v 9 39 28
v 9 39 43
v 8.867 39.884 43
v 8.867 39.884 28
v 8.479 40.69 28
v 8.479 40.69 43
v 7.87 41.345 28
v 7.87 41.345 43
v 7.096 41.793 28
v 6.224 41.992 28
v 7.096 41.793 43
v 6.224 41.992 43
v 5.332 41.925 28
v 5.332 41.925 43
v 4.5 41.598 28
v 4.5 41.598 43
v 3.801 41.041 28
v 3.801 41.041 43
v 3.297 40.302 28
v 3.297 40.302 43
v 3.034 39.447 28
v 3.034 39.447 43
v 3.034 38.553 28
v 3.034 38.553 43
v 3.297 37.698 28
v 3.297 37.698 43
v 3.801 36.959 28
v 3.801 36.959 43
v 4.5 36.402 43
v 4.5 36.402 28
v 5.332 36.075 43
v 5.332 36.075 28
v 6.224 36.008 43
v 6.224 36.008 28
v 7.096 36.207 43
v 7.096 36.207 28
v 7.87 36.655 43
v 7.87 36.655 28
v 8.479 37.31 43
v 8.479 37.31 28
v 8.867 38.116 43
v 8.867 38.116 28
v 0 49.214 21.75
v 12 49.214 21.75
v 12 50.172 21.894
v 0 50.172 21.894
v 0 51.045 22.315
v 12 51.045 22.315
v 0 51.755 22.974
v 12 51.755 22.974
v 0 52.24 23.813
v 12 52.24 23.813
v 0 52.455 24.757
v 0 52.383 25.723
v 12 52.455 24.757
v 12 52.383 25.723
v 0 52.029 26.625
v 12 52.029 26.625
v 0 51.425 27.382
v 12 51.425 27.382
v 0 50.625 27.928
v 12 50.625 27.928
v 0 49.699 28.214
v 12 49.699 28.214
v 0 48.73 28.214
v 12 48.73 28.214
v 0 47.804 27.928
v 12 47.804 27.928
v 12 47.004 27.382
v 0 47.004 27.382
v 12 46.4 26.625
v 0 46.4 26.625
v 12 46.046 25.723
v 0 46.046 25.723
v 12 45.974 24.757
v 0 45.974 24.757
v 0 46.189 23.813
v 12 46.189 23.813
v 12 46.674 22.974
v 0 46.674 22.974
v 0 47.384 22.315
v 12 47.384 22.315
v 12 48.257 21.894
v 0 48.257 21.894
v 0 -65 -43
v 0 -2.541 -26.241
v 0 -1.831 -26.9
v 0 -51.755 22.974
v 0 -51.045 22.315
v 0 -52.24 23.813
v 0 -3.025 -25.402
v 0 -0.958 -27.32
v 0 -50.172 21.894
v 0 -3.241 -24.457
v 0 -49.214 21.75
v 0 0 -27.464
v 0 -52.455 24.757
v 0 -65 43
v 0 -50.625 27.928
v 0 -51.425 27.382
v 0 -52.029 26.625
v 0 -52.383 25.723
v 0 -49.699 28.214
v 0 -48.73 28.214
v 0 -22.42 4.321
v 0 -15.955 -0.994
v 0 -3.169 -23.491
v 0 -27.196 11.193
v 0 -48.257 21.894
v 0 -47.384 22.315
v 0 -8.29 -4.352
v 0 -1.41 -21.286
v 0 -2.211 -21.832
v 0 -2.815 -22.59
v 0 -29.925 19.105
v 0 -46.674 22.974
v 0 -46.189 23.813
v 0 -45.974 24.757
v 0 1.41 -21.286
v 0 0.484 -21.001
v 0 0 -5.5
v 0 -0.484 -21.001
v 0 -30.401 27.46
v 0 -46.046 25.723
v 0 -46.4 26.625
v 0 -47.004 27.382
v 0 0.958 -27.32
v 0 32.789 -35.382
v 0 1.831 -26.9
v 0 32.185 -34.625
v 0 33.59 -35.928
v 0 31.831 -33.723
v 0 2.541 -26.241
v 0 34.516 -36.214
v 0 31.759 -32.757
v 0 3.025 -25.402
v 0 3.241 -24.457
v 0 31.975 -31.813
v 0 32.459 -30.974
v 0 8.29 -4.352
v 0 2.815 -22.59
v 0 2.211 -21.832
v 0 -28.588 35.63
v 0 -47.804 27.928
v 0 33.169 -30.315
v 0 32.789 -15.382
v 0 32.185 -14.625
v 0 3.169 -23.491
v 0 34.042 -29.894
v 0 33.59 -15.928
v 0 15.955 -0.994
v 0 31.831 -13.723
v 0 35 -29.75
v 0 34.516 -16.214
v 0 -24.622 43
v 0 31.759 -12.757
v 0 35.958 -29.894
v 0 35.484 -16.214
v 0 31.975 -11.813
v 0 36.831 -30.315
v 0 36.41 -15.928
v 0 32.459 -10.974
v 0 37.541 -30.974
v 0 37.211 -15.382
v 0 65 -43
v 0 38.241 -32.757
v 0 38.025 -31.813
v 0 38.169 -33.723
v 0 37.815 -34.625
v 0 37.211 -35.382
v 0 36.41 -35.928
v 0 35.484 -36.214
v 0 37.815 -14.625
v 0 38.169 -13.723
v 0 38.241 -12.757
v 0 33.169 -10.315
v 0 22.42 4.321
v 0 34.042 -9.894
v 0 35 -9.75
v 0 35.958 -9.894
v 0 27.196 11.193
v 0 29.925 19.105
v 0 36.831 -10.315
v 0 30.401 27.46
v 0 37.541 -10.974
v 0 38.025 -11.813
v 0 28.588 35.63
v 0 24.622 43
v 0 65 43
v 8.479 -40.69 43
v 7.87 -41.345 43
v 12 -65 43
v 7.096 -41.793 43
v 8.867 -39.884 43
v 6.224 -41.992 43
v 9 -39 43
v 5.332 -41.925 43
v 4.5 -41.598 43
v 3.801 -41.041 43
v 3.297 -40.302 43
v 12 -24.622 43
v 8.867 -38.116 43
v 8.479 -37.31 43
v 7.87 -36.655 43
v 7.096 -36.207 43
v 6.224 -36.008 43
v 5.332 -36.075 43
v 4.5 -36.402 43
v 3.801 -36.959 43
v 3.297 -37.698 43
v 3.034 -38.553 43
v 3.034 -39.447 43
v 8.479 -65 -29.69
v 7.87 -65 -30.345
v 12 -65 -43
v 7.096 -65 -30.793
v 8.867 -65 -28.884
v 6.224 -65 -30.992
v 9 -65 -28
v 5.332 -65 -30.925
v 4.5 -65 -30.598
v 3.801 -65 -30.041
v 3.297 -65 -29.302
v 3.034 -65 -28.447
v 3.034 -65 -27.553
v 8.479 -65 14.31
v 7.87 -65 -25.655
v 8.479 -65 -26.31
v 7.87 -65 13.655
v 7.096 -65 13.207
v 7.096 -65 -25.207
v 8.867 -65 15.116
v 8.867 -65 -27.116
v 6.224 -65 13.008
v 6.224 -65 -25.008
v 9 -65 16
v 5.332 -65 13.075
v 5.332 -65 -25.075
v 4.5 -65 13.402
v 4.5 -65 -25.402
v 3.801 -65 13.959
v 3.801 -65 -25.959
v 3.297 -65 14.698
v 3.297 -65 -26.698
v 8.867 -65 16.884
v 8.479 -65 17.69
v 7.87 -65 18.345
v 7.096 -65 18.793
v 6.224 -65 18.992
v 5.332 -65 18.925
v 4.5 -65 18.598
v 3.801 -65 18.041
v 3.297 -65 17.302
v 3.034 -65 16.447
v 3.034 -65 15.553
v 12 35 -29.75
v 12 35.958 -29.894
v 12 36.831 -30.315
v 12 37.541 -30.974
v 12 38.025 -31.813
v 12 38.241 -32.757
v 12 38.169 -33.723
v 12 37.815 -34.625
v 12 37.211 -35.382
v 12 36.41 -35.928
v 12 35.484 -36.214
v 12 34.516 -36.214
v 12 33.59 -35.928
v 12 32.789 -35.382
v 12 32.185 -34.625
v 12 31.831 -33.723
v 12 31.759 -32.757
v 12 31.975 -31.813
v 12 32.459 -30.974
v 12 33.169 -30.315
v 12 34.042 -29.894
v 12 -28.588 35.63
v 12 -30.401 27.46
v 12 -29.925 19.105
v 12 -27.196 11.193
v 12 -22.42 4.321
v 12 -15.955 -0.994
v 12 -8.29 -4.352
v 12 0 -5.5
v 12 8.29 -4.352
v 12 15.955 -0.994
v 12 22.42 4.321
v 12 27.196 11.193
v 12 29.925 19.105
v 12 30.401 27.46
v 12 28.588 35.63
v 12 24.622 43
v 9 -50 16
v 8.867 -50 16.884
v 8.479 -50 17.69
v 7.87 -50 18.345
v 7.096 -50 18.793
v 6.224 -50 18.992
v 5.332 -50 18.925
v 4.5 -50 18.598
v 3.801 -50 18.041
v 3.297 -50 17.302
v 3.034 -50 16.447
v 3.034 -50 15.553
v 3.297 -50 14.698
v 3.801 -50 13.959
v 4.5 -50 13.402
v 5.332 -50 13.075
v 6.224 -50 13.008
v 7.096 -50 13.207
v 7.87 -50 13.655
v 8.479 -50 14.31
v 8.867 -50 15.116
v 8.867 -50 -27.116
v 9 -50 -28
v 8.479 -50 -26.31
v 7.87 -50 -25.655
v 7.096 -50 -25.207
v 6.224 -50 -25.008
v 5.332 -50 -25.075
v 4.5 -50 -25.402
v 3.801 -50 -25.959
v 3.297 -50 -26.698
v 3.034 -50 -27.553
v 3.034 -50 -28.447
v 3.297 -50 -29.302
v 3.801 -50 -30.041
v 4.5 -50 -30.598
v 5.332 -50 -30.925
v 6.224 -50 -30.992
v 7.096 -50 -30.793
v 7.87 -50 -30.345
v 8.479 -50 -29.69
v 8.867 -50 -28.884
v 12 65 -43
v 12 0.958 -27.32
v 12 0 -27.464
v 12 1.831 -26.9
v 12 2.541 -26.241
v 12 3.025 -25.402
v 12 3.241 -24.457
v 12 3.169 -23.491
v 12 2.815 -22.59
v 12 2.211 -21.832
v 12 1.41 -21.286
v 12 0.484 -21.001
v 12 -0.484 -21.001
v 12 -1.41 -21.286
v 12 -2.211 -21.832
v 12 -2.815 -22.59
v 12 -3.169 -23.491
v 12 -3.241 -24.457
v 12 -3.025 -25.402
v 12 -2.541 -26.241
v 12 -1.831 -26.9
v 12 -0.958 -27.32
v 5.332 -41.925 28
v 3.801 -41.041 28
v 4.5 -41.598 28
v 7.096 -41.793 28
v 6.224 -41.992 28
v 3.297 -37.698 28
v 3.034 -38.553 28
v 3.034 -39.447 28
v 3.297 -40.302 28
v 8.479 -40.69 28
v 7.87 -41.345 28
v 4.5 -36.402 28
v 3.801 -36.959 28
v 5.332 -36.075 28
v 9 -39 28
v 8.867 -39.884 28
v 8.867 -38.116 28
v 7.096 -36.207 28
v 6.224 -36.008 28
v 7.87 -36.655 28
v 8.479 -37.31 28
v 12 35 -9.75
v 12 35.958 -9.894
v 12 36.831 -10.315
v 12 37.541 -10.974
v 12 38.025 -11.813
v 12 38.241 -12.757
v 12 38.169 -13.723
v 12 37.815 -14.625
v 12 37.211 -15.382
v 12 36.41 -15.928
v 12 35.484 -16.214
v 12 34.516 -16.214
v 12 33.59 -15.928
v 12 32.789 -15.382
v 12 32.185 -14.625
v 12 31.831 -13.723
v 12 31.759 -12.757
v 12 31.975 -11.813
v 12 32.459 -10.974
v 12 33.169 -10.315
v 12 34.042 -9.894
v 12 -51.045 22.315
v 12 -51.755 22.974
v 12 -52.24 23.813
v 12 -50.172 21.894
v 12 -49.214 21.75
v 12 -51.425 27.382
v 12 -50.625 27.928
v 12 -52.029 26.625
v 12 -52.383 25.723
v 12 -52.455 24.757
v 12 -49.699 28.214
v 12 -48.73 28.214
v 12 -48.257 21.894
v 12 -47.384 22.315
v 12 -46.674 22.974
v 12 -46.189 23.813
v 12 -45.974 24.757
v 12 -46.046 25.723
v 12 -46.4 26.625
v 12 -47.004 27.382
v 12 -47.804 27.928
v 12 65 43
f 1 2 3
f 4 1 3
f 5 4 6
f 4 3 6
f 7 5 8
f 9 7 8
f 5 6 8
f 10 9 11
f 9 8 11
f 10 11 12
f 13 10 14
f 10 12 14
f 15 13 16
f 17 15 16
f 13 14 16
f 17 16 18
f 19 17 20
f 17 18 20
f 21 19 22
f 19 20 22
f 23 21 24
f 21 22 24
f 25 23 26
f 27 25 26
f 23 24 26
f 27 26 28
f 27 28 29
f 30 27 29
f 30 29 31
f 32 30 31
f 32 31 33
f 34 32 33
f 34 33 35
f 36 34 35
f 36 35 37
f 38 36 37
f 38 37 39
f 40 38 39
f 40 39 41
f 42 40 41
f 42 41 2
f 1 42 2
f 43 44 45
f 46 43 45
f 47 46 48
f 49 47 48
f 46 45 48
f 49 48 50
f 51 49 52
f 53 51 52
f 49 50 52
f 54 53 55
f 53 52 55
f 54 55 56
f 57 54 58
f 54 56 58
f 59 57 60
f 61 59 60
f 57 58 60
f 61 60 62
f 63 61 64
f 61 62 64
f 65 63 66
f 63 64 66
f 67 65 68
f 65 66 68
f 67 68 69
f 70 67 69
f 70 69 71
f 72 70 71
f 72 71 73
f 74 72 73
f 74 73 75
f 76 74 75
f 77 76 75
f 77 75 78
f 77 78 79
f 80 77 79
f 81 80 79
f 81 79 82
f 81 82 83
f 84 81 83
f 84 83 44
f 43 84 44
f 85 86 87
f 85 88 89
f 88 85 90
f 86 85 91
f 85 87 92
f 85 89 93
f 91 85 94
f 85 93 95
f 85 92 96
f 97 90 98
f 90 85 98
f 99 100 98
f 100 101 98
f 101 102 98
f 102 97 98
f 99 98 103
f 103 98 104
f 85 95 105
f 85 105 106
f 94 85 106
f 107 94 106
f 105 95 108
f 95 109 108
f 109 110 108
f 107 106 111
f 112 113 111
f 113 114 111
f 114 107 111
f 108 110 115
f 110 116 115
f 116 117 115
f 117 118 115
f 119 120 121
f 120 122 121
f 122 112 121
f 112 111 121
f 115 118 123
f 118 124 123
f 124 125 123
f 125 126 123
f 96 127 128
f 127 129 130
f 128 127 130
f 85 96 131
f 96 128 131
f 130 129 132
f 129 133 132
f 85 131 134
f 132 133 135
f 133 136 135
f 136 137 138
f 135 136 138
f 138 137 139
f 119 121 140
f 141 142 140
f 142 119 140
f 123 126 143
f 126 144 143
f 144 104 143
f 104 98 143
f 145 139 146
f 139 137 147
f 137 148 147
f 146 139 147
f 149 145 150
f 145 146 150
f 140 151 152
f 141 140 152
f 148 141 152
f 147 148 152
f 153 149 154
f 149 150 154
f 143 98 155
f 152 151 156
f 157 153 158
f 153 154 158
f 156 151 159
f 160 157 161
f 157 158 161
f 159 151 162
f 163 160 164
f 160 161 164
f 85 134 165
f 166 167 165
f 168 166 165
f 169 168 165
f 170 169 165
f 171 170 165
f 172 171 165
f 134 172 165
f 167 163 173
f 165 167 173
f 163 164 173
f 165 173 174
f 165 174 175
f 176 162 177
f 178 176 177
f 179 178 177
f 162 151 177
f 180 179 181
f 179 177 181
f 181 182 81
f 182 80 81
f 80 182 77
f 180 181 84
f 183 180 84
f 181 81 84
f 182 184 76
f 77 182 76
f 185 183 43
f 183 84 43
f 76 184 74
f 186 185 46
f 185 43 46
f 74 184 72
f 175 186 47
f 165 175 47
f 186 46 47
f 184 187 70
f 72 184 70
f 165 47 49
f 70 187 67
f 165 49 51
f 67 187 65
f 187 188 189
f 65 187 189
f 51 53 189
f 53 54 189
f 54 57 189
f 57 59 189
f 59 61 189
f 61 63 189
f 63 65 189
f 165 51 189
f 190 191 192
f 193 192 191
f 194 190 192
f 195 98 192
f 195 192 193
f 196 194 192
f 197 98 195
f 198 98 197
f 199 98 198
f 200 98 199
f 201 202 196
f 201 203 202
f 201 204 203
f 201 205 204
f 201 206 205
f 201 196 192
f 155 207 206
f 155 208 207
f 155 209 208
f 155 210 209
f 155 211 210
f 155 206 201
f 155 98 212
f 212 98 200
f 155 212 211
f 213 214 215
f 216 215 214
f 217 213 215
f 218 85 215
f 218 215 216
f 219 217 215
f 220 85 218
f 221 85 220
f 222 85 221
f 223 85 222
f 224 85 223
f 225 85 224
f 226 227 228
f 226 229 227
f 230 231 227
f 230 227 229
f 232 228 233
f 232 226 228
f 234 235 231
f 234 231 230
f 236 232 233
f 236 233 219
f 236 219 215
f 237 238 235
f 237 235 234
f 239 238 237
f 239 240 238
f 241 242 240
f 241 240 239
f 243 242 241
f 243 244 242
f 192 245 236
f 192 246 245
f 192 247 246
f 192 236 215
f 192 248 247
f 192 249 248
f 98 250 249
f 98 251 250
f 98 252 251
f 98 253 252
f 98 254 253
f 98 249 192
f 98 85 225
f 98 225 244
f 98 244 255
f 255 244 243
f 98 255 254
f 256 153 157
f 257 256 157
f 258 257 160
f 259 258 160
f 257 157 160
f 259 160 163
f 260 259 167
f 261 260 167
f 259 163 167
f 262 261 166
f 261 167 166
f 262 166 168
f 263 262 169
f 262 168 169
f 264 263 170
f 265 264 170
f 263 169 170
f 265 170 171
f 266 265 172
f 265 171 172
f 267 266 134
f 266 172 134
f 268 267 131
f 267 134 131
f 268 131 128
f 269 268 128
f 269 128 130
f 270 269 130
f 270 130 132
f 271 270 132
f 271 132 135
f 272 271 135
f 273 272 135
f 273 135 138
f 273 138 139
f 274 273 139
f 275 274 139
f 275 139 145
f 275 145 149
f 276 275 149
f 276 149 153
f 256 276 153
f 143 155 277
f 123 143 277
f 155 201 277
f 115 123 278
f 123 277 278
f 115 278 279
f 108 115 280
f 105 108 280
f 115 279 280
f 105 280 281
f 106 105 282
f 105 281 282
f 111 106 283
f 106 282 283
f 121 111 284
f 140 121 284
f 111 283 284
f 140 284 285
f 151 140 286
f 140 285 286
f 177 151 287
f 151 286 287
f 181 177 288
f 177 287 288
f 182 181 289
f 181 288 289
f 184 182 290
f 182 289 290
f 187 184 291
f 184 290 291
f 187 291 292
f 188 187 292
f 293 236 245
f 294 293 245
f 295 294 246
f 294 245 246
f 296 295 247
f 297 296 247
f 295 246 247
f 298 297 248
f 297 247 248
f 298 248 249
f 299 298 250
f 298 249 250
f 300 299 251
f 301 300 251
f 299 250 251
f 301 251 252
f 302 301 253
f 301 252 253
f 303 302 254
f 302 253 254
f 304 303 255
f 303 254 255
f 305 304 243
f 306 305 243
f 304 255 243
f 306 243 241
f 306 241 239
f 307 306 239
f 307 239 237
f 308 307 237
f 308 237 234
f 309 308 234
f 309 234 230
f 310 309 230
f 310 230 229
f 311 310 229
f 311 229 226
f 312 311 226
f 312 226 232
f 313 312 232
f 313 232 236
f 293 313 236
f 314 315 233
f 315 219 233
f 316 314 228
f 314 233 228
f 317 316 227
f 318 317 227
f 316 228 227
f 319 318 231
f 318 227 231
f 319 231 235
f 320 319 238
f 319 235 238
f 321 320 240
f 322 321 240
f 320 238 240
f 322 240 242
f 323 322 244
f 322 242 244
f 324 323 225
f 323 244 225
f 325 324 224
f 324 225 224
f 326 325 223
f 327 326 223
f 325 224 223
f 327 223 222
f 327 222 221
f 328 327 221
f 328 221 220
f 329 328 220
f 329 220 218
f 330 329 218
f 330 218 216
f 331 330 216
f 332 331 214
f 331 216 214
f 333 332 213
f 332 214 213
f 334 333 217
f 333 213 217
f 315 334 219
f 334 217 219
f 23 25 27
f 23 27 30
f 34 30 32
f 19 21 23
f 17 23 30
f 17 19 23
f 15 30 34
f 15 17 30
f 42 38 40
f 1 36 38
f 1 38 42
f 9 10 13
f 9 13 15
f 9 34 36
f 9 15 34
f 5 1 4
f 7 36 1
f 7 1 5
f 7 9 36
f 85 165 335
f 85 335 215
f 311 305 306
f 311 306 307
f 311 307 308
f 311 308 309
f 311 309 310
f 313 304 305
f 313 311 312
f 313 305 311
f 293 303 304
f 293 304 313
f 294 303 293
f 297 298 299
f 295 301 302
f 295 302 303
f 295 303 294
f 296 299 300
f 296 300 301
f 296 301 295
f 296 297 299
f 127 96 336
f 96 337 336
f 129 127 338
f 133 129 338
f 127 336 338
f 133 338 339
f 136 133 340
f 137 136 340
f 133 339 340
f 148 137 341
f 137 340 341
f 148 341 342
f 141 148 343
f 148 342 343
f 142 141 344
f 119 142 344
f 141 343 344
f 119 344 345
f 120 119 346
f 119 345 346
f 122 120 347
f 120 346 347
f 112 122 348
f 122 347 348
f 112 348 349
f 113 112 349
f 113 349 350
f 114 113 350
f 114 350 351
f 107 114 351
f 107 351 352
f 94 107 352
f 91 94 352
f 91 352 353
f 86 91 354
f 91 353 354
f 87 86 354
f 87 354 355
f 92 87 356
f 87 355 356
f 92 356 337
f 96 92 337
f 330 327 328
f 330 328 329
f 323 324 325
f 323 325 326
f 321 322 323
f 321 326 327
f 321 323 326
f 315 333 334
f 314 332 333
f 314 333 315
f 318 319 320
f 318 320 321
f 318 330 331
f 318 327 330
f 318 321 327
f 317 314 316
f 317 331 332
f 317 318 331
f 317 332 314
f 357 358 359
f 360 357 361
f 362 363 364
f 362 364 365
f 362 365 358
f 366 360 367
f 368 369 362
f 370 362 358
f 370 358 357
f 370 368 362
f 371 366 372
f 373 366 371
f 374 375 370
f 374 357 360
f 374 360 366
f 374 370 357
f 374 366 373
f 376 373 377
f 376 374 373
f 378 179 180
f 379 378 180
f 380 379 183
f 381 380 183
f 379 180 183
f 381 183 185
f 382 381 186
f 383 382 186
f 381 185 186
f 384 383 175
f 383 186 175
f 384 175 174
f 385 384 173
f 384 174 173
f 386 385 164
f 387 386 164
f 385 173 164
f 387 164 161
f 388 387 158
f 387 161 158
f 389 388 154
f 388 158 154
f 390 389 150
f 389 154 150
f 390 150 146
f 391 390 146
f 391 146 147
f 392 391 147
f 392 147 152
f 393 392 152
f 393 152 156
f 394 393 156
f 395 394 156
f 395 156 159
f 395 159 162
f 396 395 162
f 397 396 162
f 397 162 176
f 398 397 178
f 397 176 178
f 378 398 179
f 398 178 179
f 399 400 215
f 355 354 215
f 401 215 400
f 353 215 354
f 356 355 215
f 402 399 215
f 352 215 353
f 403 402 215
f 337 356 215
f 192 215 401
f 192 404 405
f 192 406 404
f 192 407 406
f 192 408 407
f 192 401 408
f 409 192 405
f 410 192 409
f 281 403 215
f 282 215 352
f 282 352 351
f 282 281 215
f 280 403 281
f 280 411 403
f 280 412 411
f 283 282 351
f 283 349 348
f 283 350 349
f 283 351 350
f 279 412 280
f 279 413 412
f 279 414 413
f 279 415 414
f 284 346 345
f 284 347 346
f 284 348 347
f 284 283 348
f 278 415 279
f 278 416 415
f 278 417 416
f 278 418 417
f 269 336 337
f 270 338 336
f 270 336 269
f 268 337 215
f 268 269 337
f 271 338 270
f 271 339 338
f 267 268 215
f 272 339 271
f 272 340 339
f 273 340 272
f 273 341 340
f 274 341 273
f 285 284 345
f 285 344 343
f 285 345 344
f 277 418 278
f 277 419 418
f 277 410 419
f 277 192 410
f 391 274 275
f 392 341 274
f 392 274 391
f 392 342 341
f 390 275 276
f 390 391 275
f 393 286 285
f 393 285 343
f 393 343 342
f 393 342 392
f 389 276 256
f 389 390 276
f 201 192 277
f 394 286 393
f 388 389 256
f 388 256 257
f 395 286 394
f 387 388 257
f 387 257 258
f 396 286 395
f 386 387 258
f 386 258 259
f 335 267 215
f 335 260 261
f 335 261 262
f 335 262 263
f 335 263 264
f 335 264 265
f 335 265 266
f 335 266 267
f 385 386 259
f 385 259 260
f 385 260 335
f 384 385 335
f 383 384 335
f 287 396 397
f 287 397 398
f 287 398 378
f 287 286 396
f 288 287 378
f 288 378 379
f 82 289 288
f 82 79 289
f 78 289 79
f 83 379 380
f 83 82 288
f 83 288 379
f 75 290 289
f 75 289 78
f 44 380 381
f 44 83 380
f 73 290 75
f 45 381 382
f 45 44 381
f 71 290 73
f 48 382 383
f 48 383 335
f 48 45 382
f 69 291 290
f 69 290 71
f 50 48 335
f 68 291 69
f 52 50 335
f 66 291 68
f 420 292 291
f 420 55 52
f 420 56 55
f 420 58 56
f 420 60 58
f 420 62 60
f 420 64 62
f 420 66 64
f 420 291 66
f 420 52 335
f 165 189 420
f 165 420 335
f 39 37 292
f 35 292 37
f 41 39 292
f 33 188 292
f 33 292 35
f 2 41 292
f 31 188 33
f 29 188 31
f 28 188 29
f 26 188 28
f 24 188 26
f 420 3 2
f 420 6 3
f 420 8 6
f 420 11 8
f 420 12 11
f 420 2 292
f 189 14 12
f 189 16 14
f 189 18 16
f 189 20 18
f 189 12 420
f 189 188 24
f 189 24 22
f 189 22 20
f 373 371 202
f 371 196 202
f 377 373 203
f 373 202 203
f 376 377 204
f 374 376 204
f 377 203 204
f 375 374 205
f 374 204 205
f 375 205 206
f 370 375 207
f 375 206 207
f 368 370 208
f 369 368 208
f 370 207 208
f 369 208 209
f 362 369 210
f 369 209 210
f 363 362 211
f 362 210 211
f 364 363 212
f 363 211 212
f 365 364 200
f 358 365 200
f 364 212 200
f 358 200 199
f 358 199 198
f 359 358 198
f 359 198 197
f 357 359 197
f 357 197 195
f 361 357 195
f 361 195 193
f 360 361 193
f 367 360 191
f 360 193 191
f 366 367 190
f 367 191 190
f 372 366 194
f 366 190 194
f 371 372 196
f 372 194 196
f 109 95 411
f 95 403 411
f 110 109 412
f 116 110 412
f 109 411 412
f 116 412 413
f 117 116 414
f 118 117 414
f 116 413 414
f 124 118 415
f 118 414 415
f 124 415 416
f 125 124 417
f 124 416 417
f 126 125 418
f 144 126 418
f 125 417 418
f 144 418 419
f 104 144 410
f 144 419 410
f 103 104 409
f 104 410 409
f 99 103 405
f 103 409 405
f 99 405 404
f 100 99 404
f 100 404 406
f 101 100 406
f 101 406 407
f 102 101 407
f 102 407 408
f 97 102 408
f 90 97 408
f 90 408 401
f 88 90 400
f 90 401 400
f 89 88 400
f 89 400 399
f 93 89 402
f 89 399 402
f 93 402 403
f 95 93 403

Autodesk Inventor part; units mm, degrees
ref_plane "YZ Plane" through (0, 0, 0) normal (1, 0, 0) x (0, 1, 0)
ref_plane "XZ Plane" through (0, 0, 0) normal (0, 1, 0) x (-1, 0, 0)
ref_plane "XY Plane" through (0, 0, 0) normal (0, 0, 1) x (1, 0, 0)
sketch "Sketch1" plane through (0, 0, 0) normal (1, 0, 0) x (0, 1, 0)
  line L0 (-65, 43) -> (65, 43)
  line L1 (65, 43) -> (65, -43)
  line L2 (65, -43) -> (-65, -43)
  line L3 (-65, -43) -> (-65, 43)
  line L4 (-65, 43) -> (65, -43) construction
  line L5 (65, 43) -> (-65, -43) construction
  point P0 (0, 0)
  dimension "d0" = 130
  dimension "d1" = 86
extrude "Extrusion1" add sketch "Sketch1" along normal blind 12
sketch "Sketch2" plane through (12, 0, 0) normal (1, 0, 0) x (0, 0, -1)
  circle A0 centre (-25, 49.2145) radius 3.25
  circle A1 centre (-25, -49.2145) radius 3.25
  line L0 (-43, 65) -> (-43, -65) projected
  line L1 (-25, 49.2145) -> (-25, -49.2145) construction
  line L2 (-43, 0) -> (-25, 0) construction
  circle A2 centre (24.2145, 0) radius 3.25
  line L3 (-25, 0) -> (24.2145, 0) construction
  circle A3 centre (-25, 0) radius 30.5
  point P0 (0, 0)
  dimension "d4" = 18
  dimension "d5" = 18
  dimension "d6" = 98.429
  dimension "d7" = 6.5
  dimension "d8" = 6.5
  dimension "d9" = 6.5
  dimension "d10" = 49.2145
  dimension "d13" = 61
extrude "Extrusion2" cut sketch "Sketch2" against normal through all
ref_plane "Work Plane1" through (6, 0, 0) normal (1, 0, 0) x (0, 0, -1)
sketch "Sketch3" plane through (0, 65, 43) normal (0, 0, 1) x (1, 0, 0)
  circle A0 centre (6, -8) radius 3 construction
  circle A1 centre (6, -104) radius 3
  line L0 (0, -130) -> (12, -130) projected
  line L1 (6, -130) -> (6, 0) construction
  line L2 (0, 0) -> (12, 0) projected
  circle A2 centre (6, -26) radius 3
  point P0 (0, -65)
  dimension "d14" = 6
  dimension "d15" = 26
  dimension "d17" = 8
  dimension "d29" = 18
extrude "Extrusion3" cut sketch "Sketch3" against normal blind 15
sketch "Sketch4" plane through (0, -65, -43) normal (0, -1, 0) x (1, 0, 0)
  circle A0 centre (6, 15) radius 3
  circle A1 centre (6, 59) radius 3
  line L0 (0, 0) -> (12, 0) projected
  line L1 (6, 0) -> (6, 86) construction
  line L2 (0, 86) -> (12, 86) projected
  point P0 (0, 43)
  dimension "d21" = 6
  dimension "d22" = 27
  dimension "d23" = 15
extrude "Extrusion4" cut sketch "Sketch4" against normal blind 15
sketch "Sketch6" plane through (0, 0, 0) normal (-1, 0, 0) x (0, 0, 1)
  circle A0 centre (-33, 35) radius 3 construction
  circle A1 centre (-13, 35) radius 3 construction
  circle A2 centre (-13, 35) radius 3.25
  circle A3 centre (-33, 35) radius 3.25
  point P0 (0, 0)
  dimension "d32" = 0.25
  dimension "d33" = 0.25
extrude "Extrusion6" cut sketch "Sketch6" against normal through all
thread "Thread1" size "M6x1" class "6H" standard "ANSI Metric M Profile" full length
thread "Thread2" size "M6x1" class "6H" standard "ANSI Metric M Profile" full length
thread "Thread3" size "M6x1" class "6H" standard "ANSI Metric M Profile" full length
thread "Thread4" size "M6x1" class "6H" standard "ANSI Metric M Profile" full length
equation "\"d10\" = 0.5 * d6"
properties part number "MotorHolderLongAxis"
